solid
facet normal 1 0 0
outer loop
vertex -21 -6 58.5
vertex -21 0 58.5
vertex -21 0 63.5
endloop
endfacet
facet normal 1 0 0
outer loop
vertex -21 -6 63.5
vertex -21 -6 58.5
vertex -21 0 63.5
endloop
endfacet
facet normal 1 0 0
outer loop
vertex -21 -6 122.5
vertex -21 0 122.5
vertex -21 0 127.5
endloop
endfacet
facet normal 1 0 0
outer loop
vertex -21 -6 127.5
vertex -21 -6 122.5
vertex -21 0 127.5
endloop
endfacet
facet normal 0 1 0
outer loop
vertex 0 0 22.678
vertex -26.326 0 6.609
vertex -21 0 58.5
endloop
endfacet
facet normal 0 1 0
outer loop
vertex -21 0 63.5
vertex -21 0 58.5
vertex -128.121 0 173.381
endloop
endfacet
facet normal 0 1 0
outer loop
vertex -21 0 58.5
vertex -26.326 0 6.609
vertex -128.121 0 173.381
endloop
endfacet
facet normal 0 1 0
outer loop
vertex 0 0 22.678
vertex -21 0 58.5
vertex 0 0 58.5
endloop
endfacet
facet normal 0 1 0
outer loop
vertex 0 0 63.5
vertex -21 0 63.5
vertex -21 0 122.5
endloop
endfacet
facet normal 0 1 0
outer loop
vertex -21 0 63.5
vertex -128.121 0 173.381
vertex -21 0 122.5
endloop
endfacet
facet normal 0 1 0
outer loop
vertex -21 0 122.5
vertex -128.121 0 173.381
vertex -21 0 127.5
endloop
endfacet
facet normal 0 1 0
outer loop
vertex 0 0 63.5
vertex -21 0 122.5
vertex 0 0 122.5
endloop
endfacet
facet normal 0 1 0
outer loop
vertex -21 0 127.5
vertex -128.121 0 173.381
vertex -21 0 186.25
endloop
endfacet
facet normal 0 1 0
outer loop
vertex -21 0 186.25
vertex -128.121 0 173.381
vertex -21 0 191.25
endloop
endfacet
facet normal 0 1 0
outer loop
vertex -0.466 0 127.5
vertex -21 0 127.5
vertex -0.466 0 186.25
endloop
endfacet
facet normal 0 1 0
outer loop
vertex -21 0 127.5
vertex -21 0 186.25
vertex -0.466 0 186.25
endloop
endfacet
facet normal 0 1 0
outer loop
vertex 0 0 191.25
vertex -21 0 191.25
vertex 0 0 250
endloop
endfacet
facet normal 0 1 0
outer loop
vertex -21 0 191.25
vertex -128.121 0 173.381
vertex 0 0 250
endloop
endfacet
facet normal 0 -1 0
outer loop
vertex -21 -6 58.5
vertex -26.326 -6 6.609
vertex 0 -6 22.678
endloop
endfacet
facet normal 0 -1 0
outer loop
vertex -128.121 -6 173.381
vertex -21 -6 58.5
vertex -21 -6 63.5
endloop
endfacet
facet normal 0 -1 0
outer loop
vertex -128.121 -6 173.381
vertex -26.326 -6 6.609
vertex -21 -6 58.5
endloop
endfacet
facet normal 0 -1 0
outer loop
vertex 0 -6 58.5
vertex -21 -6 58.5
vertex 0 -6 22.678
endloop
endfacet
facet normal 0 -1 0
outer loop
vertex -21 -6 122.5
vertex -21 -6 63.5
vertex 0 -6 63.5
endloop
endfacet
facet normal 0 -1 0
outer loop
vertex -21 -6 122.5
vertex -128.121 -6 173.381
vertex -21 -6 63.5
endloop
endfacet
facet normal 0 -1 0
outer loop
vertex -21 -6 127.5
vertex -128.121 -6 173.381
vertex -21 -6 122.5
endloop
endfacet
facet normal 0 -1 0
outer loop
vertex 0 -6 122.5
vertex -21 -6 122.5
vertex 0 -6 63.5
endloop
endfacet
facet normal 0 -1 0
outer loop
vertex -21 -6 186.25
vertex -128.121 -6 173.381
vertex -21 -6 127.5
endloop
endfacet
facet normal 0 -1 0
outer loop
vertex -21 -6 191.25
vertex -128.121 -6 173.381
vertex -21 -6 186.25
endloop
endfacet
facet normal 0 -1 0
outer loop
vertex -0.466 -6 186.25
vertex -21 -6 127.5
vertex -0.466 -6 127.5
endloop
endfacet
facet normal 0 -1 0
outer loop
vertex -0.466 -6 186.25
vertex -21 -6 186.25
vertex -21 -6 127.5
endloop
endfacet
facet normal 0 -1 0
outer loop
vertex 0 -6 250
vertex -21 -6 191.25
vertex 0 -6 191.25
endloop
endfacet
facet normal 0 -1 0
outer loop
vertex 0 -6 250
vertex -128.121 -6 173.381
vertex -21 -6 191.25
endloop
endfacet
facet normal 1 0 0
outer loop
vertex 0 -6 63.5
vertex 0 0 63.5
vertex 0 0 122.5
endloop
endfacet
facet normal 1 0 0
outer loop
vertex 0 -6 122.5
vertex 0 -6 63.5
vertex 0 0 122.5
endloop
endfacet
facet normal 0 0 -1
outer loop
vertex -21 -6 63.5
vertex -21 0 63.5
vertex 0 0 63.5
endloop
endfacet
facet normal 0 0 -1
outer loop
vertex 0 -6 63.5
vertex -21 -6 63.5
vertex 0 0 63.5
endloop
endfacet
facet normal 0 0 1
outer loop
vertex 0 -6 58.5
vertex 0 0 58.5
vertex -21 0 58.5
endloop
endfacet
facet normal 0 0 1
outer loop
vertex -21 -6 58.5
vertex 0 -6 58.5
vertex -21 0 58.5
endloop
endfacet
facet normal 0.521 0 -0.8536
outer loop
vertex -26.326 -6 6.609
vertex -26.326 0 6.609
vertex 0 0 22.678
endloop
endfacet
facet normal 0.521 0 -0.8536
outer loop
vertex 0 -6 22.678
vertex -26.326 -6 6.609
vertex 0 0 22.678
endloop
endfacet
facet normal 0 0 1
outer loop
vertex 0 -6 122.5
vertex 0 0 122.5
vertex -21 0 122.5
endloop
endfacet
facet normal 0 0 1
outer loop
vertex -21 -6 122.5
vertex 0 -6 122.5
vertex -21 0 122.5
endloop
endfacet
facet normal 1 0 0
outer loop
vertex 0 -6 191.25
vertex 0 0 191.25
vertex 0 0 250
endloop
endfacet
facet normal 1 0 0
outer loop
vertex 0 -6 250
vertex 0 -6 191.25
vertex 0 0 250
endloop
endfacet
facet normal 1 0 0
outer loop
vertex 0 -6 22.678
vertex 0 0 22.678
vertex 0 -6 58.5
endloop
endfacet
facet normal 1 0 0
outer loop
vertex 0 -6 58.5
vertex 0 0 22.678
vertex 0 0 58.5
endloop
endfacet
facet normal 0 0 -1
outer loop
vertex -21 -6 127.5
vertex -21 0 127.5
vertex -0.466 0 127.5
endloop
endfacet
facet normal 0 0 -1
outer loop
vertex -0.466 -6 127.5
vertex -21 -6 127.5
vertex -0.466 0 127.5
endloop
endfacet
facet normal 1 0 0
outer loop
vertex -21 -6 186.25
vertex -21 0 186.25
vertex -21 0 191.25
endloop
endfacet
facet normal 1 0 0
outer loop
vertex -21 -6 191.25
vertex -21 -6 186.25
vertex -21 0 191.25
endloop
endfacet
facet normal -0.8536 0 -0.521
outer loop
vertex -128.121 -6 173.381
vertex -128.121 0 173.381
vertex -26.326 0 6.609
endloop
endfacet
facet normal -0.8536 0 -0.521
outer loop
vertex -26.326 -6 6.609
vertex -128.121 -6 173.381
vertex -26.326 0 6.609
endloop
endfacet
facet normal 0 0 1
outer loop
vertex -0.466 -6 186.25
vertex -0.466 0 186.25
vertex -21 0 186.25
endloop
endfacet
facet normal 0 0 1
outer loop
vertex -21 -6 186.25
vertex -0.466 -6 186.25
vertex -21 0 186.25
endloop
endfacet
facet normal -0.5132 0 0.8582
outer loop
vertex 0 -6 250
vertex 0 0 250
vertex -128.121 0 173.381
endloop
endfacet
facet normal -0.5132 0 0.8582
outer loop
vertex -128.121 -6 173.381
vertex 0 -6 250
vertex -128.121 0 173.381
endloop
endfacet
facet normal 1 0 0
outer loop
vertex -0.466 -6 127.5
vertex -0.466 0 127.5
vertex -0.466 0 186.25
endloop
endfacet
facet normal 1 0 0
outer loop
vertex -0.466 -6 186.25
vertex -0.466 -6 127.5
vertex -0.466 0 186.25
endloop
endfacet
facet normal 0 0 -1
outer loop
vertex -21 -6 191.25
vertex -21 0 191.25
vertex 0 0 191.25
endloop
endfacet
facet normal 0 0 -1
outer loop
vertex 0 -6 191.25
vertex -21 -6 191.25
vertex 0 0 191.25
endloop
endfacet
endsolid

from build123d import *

# Parameters (mm, degrees)
F1_DEPTH = 6


with BuildPart() as f1:
    # F0 (on Front) → F1 (new body)
    with BuildSketch(Plane.XZ):
        Polygon((0, 22.677863), (0, 58.5), (-21, 58.5), (-21, 63.5), (0, 63.5), (0, 63.75), (0, 122.5), (-21, 122.5), (-21, 127.5), (-0.465679, 127.5), (-0.465679, 173.380539), (-128.12072, 173.380539), (-26.326123, 6.608847), align=None)
        Polygon((0, 250), (-128.12072, 173.380539), (-0.465679, 173.380539), (-0.465679, 186.25), (-21, 186.25), (-21, 191.25), (0, 191.25), align=None)
    extrude(amount=F1_DEPTH)


solid = f1.part
